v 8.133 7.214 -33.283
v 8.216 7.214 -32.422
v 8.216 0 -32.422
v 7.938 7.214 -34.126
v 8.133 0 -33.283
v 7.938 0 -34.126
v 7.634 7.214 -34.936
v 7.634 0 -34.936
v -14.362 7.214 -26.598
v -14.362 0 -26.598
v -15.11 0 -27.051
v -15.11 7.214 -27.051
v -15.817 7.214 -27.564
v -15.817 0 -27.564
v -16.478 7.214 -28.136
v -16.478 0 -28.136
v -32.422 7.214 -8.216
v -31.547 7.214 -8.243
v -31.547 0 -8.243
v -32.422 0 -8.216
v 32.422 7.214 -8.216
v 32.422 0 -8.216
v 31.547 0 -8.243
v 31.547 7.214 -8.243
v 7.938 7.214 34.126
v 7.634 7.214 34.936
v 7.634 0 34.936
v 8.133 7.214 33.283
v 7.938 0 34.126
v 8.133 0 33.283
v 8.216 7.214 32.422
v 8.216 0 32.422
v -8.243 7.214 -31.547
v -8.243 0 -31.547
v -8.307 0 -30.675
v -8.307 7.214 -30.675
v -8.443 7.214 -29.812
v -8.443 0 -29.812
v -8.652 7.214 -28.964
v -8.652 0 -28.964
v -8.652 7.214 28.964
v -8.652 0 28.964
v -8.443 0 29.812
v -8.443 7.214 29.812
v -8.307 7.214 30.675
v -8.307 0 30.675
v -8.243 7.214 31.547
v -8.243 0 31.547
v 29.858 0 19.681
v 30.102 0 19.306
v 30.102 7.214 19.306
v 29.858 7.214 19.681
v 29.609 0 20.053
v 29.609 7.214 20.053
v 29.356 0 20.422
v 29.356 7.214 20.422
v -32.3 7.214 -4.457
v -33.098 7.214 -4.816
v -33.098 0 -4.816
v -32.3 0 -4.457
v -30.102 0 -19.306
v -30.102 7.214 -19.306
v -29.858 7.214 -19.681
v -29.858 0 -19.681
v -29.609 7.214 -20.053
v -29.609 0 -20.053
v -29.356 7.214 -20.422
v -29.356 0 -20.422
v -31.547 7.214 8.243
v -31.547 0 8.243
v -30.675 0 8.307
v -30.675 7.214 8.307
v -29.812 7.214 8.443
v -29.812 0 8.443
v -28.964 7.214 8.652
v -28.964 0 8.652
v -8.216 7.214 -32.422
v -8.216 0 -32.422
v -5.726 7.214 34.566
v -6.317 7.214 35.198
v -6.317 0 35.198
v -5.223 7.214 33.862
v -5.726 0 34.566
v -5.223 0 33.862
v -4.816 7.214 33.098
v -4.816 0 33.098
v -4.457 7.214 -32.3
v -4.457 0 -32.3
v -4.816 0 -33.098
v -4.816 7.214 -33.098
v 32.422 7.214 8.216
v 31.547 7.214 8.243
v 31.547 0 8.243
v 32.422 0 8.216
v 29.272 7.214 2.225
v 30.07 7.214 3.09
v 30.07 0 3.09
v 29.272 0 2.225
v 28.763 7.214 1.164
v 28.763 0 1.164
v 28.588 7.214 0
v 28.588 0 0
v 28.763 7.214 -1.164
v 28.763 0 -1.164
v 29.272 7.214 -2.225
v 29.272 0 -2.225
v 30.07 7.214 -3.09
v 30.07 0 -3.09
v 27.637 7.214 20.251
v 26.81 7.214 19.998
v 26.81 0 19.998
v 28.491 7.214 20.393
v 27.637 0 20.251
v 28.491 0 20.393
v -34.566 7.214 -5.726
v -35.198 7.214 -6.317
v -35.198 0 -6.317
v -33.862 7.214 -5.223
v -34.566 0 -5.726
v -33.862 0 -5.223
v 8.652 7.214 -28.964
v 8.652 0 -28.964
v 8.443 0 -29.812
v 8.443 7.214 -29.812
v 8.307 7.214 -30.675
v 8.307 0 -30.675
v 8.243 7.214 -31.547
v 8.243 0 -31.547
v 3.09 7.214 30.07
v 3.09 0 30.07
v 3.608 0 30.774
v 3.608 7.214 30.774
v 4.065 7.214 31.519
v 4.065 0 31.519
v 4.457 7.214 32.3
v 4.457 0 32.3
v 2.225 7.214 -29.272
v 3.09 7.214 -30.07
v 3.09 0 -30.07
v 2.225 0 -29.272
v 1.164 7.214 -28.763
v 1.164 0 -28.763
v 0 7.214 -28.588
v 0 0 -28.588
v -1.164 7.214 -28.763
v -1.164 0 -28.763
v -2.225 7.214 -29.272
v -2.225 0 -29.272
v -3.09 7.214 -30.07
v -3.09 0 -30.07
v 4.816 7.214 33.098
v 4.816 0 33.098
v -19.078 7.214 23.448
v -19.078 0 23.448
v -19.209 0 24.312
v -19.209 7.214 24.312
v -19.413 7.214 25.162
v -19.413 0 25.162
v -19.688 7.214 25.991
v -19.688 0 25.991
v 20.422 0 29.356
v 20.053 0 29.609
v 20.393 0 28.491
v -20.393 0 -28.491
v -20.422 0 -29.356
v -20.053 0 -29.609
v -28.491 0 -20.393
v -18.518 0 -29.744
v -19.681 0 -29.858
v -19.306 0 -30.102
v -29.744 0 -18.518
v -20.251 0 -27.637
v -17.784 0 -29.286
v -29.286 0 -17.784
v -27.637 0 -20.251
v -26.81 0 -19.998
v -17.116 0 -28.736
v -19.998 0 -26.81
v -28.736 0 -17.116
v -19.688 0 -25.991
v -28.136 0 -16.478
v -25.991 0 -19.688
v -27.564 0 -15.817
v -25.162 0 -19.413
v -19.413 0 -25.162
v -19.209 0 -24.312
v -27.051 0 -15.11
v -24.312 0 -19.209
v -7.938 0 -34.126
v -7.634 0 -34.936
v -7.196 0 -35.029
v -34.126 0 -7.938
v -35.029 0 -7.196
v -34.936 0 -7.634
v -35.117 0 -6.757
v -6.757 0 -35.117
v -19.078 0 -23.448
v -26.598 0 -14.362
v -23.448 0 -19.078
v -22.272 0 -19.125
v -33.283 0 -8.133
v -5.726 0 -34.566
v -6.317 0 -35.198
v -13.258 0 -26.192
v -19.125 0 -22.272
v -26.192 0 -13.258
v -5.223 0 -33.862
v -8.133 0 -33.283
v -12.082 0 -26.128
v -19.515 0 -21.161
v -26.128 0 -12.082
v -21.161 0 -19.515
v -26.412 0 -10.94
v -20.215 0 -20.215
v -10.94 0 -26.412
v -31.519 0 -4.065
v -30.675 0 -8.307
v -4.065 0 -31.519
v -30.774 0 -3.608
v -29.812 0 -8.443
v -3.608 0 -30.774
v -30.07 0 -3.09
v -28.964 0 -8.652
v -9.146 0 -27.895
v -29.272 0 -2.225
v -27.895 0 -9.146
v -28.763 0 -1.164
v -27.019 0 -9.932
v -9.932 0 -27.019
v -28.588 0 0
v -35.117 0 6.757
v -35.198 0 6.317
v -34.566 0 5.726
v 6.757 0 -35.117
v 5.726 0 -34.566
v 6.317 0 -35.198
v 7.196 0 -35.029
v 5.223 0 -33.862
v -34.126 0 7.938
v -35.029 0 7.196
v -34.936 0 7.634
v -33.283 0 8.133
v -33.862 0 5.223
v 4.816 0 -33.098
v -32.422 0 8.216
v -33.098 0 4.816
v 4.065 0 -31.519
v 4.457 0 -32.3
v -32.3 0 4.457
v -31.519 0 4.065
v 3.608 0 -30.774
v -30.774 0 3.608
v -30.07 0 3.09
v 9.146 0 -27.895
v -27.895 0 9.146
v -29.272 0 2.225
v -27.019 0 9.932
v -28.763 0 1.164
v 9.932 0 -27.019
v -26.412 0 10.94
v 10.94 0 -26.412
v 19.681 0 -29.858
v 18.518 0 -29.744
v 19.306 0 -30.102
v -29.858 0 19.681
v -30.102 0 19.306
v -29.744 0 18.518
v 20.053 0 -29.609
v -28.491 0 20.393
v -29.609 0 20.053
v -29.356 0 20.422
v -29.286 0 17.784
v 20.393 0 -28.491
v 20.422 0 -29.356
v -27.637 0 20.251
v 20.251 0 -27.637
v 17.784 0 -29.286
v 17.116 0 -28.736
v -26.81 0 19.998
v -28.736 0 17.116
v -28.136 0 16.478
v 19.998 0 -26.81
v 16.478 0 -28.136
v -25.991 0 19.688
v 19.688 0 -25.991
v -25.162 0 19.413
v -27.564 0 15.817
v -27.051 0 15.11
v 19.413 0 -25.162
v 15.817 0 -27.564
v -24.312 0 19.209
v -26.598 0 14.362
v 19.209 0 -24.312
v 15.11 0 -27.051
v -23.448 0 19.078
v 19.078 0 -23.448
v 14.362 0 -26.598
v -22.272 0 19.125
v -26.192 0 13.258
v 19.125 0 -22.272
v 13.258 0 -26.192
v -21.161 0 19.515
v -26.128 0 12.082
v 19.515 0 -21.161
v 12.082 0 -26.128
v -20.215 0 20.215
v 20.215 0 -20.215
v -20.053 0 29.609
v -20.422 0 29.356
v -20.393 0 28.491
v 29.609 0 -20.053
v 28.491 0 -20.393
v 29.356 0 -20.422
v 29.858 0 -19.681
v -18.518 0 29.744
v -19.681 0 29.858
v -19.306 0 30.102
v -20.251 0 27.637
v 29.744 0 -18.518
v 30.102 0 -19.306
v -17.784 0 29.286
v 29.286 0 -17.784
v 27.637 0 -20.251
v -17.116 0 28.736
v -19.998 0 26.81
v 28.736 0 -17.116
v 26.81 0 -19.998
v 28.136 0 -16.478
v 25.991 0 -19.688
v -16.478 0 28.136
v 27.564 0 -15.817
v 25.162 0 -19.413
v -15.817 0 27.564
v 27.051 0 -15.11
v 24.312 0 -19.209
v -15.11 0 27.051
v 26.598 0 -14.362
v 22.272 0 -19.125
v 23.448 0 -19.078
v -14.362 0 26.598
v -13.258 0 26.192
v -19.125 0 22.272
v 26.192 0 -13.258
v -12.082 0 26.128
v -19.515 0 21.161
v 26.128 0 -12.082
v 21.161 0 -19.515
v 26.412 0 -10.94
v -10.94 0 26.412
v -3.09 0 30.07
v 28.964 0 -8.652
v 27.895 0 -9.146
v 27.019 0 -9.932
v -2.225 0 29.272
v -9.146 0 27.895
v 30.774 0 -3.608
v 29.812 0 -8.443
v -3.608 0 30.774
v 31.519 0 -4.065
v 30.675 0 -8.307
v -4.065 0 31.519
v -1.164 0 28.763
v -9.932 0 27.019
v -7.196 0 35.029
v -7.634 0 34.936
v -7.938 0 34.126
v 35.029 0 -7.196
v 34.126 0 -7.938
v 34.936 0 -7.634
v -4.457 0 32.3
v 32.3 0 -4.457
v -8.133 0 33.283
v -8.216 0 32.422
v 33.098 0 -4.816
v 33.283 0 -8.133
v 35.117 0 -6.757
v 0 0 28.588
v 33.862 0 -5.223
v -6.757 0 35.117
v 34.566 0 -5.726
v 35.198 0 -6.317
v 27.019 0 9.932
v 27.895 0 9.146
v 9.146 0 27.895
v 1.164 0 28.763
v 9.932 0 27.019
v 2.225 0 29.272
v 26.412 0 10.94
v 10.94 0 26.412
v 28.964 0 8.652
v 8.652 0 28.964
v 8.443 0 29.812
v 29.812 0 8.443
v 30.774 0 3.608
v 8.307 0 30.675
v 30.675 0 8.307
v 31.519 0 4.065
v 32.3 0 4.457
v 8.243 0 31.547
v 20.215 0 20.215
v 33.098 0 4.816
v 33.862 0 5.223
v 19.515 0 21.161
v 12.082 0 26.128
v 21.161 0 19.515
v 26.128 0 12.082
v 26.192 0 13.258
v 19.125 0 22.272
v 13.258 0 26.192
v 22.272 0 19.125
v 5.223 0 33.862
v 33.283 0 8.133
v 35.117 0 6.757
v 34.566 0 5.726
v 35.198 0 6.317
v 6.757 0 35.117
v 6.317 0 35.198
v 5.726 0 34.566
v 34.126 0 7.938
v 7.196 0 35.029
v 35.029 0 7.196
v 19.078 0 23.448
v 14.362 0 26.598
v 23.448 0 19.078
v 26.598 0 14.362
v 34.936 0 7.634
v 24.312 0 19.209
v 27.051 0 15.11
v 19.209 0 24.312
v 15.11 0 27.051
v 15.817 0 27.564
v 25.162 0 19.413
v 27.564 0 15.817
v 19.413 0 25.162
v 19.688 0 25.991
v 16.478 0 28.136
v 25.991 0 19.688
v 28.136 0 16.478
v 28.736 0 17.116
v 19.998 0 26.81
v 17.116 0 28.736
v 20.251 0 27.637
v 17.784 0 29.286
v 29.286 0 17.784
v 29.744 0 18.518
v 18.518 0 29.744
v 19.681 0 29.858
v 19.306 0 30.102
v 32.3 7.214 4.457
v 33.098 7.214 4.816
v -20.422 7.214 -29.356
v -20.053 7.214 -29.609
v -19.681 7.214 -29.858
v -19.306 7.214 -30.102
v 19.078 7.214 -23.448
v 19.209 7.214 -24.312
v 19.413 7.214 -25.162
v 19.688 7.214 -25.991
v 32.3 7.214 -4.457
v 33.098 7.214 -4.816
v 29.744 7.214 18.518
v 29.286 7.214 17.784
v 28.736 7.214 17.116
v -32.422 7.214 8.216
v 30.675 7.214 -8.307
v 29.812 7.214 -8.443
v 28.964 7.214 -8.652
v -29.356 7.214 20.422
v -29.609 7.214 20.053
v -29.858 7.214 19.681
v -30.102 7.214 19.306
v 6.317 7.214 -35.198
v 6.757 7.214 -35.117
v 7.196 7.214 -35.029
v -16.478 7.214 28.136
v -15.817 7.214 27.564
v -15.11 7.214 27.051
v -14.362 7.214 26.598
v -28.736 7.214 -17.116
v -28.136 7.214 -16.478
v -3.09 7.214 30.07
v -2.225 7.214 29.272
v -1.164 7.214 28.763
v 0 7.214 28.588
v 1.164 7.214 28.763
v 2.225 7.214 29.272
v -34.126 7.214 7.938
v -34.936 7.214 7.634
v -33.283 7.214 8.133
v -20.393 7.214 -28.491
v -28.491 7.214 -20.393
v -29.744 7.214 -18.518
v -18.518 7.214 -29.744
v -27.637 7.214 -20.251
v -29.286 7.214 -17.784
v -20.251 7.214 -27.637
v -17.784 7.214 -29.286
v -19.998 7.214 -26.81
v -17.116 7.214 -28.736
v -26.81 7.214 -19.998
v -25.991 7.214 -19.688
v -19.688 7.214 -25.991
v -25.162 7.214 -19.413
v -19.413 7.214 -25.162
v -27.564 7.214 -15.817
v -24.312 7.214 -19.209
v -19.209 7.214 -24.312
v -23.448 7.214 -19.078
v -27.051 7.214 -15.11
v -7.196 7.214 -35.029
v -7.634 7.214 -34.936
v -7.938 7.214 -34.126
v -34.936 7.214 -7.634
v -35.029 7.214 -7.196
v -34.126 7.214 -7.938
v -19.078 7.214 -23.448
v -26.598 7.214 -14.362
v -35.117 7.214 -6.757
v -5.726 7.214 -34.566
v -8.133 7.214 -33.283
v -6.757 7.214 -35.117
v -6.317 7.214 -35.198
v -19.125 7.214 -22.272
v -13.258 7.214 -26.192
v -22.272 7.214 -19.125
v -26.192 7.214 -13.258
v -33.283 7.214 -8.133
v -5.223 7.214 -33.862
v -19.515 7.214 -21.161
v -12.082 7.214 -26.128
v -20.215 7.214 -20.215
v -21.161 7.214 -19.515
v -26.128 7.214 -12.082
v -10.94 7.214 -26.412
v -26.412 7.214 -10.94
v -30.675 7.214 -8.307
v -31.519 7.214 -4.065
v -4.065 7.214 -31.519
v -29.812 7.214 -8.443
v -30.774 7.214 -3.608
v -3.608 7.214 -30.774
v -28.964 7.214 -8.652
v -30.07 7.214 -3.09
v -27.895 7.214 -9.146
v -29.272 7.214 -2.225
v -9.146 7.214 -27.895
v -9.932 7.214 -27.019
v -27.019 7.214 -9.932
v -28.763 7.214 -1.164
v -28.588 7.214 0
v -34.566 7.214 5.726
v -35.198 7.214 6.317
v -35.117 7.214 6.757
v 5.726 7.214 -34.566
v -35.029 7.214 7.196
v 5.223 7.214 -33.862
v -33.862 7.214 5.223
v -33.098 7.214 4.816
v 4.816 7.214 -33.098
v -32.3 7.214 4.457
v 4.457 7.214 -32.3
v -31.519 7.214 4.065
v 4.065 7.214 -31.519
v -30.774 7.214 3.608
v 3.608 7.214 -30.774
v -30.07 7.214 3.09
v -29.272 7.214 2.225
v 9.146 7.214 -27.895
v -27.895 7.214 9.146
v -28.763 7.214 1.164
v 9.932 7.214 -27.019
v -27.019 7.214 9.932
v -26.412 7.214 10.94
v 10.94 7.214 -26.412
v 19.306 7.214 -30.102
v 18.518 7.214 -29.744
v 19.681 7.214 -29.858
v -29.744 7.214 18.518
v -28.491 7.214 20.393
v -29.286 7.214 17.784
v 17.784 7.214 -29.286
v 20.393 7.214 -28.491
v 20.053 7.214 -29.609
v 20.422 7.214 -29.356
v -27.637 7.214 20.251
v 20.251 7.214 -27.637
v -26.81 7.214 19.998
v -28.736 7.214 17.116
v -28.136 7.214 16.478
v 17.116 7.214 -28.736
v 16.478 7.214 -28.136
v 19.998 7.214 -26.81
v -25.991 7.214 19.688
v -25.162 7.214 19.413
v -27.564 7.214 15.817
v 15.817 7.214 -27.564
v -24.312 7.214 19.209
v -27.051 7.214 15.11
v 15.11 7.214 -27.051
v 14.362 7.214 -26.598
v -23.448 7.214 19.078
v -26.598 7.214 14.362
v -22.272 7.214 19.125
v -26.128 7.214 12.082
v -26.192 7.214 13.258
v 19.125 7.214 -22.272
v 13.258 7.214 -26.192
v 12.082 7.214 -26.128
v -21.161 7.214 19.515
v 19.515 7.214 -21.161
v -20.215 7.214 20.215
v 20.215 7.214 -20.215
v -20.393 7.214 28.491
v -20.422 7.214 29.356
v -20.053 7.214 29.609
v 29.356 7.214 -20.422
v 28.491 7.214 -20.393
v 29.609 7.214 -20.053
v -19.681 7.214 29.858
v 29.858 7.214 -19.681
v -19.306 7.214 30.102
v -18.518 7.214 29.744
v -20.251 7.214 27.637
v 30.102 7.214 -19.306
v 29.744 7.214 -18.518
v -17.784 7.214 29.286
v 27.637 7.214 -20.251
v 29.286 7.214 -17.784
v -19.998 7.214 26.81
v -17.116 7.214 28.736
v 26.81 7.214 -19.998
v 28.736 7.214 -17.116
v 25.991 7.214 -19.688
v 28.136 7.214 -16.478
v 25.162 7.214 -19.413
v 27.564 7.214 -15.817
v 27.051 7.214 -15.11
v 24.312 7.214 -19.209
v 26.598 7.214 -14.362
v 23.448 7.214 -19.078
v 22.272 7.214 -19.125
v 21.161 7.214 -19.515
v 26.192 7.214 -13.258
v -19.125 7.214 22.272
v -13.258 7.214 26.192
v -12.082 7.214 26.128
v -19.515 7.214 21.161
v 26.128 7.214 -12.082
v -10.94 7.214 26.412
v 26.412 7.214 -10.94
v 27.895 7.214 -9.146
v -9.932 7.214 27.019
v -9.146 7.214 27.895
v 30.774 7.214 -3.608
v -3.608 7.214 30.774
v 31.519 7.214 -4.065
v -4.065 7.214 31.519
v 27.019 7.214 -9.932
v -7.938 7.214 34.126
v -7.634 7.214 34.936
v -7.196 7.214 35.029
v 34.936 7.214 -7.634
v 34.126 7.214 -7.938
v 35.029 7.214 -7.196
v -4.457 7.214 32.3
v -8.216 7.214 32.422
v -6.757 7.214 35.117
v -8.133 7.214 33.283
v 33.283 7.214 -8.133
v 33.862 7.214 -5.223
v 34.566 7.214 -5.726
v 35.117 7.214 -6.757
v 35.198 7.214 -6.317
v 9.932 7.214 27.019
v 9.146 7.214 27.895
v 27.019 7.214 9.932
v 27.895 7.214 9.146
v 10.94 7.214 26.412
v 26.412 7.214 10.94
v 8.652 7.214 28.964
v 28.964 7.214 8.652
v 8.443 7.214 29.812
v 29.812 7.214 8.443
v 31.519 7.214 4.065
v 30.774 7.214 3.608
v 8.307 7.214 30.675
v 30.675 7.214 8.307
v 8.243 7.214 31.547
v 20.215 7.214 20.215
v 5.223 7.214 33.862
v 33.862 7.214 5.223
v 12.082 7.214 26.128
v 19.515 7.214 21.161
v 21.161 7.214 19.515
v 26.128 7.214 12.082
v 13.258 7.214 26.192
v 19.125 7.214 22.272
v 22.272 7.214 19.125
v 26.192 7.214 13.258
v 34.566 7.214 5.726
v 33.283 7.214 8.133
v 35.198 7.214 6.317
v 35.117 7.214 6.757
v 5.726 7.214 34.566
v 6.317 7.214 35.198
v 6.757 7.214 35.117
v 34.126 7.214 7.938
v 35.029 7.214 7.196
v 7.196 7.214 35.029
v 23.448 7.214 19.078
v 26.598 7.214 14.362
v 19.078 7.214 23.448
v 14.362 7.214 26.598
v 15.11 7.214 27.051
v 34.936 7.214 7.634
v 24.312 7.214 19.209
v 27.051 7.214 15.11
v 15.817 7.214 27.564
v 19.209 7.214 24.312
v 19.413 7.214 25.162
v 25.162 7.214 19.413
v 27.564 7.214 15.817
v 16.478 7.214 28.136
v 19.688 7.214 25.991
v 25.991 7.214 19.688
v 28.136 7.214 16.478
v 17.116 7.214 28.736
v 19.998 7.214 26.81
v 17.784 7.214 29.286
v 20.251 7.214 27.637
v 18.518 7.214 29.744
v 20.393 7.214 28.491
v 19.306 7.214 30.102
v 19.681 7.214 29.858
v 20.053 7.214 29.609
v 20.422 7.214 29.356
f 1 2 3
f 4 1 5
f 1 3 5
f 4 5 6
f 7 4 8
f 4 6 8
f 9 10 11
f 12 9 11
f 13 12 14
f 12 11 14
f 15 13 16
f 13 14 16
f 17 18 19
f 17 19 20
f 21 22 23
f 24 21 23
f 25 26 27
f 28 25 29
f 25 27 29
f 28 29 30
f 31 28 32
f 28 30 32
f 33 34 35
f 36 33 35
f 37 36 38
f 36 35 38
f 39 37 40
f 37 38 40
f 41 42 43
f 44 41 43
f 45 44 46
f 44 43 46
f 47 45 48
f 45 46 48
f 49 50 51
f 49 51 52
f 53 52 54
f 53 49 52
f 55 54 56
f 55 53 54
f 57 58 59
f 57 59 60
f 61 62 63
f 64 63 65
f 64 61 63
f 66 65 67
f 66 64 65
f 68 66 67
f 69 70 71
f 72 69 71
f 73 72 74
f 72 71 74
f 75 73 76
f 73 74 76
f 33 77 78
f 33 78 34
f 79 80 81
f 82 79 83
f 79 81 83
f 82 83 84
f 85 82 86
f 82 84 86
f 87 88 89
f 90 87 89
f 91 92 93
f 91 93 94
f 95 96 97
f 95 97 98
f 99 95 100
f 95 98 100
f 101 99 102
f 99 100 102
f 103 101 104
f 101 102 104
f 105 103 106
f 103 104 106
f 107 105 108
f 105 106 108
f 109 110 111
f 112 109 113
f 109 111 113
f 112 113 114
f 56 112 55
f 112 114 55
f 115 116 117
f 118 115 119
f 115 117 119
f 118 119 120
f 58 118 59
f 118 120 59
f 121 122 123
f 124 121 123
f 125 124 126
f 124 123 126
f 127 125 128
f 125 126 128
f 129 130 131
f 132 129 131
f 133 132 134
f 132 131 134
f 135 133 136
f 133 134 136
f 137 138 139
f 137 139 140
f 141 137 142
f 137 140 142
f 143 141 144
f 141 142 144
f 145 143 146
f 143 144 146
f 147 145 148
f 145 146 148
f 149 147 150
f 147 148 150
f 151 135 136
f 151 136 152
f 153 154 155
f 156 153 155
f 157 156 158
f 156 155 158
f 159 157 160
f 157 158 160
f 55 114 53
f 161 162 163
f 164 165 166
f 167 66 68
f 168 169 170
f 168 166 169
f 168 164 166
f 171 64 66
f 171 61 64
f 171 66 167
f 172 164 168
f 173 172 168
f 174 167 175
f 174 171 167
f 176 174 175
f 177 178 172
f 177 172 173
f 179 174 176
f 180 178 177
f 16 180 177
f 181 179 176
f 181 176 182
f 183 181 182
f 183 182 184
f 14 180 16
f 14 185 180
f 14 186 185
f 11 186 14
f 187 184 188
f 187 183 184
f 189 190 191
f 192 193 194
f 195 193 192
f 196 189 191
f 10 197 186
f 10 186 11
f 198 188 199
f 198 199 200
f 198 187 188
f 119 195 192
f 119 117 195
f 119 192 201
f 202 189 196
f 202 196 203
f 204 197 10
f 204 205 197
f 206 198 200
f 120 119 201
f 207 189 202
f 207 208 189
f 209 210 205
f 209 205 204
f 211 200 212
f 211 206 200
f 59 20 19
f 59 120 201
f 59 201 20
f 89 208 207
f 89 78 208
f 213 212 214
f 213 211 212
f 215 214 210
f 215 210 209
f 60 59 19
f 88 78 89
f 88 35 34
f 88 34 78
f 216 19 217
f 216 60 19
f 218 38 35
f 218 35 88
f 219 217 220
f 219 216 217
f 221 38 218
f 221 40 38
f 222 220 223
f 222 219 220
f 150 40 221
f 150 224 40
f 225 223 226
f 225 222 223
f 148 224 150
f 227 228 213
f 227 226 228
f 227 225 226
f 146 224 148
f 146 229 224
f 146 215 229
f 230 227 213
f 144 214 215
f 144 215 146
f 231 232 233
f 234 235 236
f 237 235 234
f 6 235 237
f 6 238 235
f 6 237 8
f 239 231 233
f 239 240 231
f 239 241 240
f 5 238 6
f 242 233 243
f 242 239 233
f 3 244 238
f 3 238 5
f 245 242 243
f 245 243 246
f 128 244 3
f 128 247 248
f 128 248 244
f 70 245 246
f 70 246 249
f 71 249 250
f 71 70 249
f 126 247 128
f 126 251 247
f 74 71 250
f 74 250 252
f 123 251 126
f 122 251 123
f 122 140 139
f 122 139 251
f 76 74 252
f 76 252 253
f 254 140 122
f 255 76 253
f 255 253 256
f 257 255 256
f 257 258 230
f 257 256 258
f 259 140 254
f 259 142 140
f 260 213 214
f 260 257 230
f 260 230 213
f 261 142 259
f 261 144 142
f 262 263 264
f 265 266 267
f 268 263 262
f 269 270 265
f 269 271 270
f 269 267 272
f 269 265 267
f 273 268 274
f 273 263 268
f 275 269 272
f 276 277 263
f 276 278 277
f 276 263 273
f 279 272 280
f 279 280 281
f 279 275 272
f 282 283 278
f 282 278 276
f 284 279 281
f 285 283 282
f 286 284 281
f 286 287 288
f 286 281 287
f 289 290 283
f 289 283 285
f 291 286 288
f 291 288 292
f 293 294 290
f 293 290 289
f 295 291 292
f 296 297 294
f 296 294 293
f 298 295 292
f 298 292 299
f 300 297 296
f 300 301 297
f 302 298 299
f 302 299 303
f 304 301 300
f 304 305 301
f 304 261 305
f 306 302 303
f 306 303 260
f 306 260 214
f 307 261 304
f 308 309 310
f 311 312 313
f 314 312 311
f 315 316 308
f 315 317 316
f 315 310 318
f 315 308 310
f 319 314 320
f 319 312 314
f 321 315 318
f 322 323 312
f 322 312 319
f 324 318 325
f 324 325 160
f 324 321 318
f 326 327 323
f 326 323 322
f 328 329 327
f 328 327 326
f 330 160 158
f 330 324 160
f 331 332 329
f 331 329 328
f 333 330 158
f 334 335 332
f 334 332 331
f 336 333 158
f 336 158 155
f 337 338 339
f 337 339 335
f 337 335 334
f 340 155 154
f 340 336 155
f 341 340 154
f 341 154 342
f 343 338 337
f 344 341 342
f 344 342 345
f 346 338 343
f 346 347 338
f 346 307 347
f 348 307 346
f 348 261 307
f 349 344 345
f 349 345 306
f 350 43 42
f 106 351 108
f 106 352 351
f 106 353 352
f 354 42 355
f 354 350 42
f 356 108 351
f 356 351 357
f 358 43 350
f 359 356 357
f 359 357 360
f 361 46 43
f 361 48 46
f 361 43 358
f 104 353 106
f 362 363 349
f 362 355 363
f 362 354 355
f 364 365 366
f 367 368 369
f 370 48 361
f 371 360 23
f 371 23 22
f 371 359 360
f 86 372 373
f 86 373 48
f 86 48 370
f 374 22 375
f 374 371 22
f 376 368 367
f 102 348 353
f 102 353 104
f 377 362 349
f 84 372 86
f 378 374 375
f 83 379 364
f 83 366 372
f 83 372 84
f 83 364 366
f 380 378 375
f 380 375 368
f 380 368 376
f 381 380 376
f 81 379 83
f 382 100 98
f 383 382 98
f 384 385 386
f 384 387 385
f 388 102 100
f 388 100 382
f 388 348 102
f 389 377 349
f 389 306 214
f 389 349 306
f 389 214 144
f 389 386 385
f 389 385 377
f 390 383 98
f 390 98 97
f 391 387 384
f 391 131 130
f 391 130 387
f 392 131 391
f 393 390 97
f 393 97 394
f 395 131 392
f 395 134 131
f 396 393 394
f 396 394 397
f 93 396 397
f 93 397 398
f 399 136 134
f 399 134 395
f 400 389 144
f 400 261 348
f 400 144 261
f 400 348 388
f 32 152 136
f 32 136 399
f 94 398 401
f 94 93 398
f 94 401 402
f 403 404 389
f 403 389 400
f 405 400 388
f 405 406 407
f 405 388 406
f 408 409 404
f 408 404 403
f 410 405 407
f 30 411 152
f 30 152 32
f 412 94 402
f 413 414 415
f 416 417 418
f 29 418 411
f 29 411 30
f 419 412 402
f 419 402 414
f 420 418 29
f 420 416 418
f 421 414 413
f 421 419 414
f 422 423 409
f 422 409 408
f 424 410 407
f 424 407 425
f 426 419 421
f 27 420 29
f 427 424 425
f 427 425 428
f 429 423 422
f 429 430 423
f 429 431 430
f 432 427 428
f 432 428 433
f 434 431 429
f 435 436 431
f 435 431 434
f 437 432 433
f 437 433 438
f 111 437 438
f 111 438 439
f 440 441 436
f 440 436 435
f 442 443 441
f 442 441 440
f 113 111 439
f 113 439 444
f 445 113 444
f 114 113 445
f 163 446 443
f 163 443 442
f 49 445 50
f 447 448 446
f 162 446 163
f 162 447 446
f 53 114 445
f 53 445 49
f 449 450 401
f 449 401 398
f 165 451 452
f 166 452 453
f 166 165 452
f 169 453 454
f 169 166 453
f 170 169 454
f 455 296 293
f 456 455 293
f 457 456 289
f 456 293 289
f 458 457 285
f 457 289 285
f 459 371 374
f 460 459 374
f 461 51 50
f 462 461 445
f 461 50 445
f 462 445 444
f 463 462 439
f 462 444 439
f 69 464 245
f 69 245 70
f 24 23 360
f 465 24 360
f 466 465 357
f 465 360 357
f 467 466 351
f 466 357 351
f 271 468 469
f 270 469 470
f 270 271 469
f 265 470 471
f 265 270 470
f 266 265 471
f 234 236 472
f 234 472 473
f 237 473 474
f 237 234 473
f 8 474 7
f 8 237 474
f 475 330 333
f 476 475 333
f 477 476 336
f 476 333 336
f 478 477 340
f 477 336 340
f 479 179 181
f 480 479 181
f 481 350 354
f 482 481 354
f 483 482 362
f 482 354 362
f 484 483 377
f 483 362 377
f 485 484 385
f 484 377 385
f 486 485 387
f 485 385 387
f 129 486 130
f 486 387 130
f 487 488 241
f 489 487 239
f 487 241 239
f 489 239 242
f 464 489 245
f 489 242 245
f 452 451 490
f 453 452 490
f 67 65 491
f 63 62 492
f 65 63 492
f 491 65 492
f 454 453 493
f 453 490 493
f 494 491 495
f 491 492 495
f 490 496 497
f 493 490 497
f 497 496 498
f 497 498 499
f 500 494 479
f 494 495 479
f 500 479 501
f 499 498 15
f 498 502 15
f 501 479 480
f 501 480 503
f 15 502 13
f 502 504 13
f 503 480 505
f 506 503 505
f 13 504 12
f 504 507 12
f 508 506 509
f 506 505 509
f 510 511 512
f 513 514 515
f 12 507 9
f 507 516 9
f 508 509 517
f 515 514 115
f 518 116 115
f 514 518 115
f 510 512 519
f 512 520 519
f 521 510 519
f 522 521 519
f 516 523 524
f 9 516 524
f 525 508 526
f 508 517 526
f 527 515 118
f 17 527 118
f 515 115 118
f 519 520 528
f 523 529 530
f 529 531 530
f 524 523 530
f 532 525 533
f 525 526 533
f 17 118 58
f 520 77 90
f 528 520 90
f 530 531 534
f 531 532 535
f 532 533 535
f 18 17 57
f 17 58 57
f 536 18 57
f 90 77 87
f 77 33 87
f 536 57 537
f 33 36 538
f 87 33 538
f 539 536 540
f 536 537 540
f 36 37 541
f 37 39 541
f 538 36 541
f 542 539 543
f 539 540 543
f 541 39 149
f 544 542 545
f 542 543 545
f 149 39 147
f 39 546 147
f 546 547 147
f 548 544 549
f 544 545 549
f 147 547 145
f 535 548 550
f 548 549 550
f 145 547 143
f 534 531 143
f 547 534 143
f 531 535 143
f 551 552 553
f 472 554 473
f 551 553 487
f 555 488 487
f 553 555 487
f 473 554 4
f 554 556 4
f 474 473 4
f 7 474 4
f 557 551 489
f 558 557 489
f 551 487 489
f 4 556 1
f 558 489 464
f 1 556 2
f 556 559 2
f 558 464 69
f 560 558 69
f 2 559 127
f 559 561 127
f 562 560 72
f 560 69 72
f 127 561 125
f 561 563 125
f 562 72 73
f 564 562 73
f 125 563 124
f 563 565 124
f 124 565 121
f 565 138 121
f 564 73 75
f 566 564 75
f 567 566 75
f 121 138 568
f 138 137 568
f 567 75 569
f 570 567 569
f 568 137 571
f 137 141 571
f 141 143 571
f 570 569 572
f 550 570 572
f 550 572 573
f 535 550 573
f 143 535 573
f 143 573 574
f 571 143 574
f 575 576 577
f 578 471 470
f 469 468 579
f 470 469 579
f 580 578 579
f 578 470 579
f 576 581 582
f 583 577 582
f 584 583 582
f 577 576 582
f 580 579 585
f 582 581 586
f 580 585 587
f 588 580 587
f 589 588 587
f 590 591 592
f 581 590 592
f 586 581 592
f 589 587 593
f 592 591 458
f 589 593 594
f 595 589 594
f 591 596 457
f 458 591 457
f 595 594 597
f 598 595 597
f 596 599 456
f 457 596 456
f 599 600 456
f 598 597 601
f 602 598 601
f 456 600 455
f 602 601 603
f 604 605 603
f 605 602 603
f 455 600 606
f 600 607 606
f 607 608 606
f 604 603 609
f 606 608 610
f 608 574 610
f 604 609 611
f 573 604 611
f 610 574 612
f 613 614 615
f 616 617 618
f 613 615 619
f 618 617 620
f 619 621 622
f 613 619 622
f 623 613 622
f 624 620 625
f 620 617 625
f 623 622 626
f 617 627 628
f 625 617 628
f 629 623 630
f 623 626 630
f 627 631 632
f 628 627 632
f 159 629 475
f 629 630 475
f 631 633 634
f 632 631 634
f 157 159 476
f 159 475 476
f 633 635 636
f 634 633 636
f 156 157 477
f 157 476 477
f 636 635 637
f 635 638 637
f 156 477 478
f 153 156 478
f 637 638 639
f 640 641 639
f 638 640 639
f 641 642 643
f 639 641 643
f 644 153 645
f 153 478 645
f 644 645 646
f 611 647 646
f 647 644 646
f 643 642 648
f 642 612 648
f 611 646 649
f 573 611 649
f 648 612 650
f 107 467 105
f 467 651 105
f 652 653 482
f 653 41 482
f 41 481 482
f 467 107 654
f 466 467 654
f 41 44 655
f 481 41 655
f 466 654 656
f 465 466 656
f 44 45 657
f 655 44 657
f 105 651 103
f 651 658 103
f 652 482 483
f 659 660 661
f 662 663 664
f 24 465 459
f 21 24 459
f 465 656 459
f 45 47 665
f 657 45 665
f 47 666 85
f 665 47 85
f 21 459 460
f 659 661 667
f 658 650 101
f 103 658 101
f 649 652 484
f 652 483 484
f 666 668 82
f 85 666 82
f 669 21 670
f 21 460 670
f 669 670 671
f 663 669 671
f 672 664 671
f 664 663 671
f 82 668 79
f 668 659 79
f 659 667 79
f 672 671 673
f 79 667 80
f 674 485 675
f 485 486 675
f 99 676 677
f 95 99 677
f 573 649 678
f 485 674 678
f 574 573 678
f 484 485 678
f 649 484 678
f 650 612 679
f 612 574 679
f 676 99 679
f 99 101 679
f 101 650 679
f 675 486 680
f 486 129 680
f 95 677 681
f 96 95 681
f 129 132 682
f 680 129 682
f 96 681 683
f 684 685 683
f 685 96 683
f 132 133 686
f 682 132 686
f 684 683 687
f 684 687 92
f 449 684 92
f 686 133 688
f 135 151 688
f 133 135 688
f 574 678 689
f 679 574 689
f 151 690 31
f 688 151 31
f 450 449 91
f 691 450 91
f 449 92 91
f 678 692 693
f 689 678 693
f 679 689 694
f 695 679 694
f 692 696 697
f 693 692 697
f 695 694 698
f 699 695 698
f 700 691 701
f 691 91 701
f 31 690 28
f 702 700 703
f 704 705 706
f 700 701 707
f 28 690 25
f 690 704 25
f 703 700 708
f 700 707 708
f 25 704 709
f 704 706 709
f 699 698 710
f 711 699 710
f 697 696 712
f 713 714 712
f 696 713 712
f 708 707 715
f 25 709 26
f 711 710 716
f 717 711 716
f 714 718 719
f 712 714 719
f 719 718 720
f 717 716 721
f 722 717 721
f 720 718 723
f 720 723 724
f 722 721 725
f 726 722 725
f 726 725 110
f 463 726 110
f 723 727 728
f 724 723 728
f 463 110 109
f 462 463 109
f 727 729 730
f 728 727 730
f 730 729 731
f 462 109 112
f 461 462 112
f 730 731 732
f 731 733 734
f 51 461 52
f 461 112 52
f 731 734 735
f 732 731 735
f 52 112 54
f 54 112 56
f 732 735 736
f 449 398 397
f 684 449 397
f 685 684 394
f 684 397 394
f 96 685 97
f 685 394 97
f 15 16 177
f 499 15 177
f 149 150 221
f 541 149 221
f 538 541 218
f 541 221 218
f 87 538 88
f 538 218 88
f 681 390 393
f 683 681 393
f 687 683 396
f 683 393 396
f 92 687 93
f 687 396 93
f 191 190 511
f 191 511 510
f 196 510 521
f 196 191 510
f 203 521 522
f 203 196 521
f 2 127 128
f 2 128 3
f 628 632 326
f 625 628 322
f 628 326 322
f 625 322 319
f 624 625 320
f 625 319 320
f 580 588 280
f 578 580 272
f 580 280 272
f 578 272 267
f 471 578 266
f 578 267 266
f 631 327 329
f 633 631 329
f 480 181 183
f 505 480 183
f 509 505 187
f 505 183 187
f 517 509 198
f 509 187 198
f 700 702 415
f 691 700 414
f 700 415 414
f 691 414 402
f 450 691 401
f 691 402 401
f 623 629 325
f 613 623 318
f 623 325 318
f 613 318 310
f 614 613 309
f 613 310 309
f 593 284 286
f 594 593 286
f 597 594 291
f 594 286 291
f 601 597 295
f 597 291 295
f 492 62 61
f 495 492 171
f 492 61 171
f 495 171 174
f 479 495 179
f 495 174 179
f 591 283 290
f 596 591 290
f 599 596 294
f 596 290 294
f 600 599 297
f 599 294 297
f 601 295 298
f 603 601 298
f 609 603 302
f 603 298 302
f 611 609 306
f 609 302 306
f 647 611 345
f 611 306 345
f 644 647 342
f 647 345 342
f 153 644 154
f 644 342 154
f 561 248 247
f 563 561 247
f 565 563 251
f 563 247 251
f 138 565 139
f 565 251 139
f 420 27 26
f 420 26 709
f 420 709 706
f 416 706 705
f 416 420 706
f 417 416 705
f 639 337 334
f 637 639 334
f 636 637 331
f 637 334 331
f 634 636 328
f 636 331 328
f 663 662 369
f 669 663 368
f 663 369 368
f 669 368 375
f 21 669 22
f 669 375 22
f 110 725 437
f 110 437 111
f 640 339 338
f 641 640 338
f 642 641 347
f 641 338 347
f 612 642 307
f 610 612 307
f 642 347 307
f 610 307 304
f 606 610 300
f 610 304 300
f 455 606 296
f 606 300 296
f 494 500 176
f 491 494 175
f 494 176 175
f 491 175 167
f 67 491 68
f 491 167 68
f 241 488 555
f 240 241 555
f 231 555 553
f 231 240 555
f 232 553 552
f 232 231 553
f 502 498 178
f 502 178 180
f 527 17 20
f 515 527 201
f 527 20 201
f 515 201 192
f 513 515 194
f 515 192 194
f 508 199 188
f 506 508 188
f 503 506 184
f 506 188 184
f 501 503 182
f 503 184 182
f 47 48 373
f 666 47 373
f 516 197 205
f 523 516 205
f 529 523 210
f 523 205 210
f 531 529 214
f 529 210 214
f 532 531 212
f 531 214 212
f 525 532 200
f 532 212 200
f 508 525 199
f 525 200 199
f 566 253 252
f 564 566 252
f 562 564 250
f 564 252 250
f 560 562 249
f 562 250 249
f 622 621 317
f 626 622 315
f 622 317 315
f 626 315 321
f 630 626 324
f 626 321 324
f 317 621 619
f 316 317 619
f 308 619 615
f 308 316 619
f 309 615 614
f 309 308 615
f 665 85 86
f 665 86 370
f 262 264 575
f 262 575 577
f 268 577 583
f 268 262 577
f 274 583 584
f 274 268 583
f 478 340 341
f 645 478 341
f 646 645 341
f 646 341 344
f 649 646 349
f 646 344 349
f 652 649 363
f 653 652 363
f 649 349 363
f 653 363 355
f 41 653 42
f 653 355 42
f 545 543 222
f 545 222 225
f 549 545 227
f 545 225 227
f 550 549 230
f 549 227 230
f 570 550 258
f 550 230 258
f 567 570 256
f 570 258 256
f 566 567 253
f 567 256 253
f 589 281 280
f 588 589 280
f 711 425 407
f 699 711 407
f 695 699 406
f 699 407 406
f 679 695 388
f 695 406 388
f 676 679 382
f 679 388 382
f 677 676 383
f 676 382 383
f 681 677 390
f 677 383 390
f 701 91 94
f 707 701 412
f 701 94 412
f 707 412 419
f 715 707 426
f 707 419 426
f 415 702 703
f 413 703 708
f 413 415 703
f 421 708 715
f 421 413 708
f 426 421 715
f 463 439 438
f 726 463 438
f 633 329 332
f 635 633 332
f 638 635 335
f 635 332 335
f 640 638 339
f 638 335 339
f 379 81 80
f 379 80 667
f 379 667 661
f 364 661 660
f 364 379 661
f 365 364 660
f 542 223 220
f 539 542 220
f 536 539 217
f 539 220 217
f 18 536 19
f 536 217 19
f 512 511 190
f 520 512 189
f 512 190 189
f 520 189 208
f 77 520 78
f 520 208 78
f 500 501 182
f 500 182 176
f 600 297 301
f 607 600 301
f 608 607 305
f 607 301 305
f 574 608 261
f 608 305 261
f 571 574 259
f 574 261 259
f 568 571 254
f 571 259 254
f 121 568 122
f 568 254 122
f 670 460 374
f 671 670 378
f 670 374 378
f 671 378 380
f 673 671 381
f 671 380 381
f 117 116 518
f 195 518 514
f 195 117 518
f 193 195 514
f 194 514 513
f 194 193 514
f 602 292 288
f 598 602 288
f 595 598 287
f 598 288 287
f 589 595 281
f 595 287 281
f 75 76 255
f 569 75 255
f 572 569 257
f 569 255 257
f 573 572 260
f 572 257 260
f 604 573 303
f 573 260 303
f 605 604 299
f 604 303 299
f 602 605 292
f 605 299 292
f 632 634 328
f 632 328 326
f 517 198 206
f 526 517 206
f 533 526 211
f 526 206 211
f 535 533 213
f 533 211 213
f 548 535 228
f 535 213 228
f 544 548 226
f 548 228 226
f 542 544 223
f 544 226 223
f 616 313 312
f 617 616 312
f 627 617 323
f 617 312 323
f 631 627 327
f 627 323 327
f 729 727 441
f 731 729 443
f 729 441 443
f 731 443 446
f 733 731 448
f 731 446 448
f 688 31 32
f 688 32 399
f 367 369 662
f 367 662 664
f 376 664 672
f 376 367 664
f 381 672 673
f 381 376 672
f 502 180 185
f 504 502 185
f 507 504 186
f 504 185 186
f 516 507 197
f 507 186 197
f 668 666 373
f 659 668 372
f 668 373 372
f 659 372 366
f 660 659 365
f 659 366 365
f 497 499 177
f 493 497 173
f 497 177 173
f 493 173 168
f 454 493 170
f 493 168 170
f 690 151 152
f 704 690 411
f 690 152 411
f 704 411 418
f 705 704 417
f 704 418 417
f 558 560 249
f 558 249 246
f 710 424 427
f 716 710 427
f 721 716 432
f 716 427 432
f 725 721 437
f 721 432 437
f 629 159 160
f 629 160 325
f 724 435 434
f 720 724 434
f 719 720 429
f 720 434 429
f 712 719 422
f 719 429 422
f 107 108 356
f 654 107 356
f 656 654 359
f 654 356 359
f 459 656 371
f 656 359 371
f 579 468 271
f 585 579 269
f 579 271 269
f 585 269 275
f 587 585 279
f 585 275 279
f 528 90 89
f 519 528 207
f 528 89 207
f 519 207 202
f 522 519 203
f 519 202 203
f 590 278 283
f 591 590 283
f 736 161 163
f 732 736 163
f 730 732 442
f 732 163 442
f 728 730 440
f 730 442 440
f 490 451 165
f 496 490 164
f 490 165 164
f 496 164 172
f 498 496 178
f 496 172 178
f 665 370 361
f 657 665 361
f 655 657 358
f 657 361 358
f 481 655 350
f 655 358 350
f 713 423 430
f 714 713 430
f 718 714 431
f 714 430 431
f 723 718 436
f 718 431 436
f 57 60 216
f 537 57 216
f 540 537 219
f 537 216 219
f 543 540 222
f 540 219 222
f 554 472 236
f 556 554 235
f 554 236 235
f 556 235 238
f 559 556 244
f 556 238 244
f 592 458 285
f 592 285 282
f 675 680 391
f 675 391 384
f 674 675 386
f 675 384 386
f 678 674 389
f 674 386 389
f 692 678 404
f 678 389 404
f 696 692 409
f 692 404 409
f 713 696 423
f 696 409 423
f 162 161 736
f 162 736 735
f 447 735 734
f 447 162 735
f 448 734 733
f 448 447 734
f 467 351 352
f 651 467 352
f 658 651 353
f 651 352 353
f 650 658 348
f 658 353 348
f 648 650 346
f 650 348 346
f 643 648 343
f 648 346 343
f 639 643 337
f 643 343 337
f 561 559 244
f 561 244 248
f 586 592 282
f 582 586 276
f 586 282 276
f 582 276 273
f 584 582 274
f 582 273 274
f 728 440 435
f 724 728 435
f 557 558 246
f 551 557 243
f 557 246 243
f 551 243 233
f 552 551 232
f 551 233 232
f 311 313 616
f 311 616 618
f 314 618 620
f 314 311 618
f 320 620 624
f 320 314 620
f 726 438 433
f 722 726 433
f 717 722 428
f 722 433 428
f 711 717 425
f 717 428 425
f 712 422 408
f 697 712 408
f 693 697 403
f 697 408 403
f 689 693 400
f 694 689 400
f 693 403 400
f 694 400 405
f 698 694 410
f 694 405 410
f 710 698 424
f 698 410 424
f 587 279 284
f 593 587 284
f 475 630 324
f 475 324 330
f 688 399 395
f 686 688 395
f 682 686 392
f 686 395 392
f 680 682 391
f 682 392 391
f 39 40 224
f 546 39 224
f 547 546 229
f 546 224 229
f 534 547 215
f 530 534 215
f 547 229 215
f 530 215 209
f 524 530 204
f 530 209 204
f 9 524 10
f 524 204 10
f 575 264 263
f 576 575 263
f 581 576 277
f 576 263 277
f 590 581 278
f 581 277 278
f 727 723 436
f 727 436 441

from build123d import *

# Parameters (mm, degrees)
F0_R            = 35.76066
F1_DEPTH        = 7.2136
F3_DEPTH        = 7.2146
F3_COPIES_COUNT = 16


# Not quite as in the source:
# - a pattern or mirror of a feature is missing from the dataset's text; its kind, count and spacing are read off the source's solid


with BuildPart() as f1:
    # F0 (on Front) → F1 (new body)
    with BuildSketch(Plane.XZ):
        Circle(F0_R)
    extrude(amount=-F1_DEPTH)

    # F2 (on face) → F3 (cut, through all)
    with BuildSketch(Plane.XZ):
        with BuildLine():
            Line((-4.8164154778, 33.0982711732), (-4.4568878106, 32.3001493474))
            ThreePointArc((-4.4568878106, 32.3001493474), (-3.8441959519, 31.1417538349), (-3.0902142758, 30.0699408338))
            ThreePointArc((-3.0902142758, 30.0699408338), (0, 28.5877), (3.0902142758, 30.0699408338))
            ThreePointArc((3.0902142758, 30.0699408338), (3.8441959519, 31.1417538349), (4.4568878106, 32.3001493474))
            Line((4.4568878106, 32.3001493474), (4.8164154778, 33.0982711732))
            ThreePointArc((4.8164154778, 33.0982711732), (5.4627291736, 34.2224644474), (6.3166306588, 35.198366166))
            ThreePointArc((6.3166306588, 35.198366166), (0, 35.76066), (-6.3166306588, 35.198366166))
            ThreePointArc((-6.3166306588, 35.198366166), (-5.4627291736, 34.2224644474), (-4.8164154778, 33.0982711732))
        make_face()
    f3 = extrude(amount=-F3_DEPTH, mode=Mode.SUBTRACT)

    # F3_copies: F3 ×16 about axis
    f3_copies_axis = Axis((0, 0, 0), (0, 1, 0))
    for i in range(1, F3_COPIES_COUNT):
        add(f3.rotate(f3_copies_axis, i * 360 / F3_COPIES_COUNT), mode=Mode.SUBTRACT)


solid = f1.part
